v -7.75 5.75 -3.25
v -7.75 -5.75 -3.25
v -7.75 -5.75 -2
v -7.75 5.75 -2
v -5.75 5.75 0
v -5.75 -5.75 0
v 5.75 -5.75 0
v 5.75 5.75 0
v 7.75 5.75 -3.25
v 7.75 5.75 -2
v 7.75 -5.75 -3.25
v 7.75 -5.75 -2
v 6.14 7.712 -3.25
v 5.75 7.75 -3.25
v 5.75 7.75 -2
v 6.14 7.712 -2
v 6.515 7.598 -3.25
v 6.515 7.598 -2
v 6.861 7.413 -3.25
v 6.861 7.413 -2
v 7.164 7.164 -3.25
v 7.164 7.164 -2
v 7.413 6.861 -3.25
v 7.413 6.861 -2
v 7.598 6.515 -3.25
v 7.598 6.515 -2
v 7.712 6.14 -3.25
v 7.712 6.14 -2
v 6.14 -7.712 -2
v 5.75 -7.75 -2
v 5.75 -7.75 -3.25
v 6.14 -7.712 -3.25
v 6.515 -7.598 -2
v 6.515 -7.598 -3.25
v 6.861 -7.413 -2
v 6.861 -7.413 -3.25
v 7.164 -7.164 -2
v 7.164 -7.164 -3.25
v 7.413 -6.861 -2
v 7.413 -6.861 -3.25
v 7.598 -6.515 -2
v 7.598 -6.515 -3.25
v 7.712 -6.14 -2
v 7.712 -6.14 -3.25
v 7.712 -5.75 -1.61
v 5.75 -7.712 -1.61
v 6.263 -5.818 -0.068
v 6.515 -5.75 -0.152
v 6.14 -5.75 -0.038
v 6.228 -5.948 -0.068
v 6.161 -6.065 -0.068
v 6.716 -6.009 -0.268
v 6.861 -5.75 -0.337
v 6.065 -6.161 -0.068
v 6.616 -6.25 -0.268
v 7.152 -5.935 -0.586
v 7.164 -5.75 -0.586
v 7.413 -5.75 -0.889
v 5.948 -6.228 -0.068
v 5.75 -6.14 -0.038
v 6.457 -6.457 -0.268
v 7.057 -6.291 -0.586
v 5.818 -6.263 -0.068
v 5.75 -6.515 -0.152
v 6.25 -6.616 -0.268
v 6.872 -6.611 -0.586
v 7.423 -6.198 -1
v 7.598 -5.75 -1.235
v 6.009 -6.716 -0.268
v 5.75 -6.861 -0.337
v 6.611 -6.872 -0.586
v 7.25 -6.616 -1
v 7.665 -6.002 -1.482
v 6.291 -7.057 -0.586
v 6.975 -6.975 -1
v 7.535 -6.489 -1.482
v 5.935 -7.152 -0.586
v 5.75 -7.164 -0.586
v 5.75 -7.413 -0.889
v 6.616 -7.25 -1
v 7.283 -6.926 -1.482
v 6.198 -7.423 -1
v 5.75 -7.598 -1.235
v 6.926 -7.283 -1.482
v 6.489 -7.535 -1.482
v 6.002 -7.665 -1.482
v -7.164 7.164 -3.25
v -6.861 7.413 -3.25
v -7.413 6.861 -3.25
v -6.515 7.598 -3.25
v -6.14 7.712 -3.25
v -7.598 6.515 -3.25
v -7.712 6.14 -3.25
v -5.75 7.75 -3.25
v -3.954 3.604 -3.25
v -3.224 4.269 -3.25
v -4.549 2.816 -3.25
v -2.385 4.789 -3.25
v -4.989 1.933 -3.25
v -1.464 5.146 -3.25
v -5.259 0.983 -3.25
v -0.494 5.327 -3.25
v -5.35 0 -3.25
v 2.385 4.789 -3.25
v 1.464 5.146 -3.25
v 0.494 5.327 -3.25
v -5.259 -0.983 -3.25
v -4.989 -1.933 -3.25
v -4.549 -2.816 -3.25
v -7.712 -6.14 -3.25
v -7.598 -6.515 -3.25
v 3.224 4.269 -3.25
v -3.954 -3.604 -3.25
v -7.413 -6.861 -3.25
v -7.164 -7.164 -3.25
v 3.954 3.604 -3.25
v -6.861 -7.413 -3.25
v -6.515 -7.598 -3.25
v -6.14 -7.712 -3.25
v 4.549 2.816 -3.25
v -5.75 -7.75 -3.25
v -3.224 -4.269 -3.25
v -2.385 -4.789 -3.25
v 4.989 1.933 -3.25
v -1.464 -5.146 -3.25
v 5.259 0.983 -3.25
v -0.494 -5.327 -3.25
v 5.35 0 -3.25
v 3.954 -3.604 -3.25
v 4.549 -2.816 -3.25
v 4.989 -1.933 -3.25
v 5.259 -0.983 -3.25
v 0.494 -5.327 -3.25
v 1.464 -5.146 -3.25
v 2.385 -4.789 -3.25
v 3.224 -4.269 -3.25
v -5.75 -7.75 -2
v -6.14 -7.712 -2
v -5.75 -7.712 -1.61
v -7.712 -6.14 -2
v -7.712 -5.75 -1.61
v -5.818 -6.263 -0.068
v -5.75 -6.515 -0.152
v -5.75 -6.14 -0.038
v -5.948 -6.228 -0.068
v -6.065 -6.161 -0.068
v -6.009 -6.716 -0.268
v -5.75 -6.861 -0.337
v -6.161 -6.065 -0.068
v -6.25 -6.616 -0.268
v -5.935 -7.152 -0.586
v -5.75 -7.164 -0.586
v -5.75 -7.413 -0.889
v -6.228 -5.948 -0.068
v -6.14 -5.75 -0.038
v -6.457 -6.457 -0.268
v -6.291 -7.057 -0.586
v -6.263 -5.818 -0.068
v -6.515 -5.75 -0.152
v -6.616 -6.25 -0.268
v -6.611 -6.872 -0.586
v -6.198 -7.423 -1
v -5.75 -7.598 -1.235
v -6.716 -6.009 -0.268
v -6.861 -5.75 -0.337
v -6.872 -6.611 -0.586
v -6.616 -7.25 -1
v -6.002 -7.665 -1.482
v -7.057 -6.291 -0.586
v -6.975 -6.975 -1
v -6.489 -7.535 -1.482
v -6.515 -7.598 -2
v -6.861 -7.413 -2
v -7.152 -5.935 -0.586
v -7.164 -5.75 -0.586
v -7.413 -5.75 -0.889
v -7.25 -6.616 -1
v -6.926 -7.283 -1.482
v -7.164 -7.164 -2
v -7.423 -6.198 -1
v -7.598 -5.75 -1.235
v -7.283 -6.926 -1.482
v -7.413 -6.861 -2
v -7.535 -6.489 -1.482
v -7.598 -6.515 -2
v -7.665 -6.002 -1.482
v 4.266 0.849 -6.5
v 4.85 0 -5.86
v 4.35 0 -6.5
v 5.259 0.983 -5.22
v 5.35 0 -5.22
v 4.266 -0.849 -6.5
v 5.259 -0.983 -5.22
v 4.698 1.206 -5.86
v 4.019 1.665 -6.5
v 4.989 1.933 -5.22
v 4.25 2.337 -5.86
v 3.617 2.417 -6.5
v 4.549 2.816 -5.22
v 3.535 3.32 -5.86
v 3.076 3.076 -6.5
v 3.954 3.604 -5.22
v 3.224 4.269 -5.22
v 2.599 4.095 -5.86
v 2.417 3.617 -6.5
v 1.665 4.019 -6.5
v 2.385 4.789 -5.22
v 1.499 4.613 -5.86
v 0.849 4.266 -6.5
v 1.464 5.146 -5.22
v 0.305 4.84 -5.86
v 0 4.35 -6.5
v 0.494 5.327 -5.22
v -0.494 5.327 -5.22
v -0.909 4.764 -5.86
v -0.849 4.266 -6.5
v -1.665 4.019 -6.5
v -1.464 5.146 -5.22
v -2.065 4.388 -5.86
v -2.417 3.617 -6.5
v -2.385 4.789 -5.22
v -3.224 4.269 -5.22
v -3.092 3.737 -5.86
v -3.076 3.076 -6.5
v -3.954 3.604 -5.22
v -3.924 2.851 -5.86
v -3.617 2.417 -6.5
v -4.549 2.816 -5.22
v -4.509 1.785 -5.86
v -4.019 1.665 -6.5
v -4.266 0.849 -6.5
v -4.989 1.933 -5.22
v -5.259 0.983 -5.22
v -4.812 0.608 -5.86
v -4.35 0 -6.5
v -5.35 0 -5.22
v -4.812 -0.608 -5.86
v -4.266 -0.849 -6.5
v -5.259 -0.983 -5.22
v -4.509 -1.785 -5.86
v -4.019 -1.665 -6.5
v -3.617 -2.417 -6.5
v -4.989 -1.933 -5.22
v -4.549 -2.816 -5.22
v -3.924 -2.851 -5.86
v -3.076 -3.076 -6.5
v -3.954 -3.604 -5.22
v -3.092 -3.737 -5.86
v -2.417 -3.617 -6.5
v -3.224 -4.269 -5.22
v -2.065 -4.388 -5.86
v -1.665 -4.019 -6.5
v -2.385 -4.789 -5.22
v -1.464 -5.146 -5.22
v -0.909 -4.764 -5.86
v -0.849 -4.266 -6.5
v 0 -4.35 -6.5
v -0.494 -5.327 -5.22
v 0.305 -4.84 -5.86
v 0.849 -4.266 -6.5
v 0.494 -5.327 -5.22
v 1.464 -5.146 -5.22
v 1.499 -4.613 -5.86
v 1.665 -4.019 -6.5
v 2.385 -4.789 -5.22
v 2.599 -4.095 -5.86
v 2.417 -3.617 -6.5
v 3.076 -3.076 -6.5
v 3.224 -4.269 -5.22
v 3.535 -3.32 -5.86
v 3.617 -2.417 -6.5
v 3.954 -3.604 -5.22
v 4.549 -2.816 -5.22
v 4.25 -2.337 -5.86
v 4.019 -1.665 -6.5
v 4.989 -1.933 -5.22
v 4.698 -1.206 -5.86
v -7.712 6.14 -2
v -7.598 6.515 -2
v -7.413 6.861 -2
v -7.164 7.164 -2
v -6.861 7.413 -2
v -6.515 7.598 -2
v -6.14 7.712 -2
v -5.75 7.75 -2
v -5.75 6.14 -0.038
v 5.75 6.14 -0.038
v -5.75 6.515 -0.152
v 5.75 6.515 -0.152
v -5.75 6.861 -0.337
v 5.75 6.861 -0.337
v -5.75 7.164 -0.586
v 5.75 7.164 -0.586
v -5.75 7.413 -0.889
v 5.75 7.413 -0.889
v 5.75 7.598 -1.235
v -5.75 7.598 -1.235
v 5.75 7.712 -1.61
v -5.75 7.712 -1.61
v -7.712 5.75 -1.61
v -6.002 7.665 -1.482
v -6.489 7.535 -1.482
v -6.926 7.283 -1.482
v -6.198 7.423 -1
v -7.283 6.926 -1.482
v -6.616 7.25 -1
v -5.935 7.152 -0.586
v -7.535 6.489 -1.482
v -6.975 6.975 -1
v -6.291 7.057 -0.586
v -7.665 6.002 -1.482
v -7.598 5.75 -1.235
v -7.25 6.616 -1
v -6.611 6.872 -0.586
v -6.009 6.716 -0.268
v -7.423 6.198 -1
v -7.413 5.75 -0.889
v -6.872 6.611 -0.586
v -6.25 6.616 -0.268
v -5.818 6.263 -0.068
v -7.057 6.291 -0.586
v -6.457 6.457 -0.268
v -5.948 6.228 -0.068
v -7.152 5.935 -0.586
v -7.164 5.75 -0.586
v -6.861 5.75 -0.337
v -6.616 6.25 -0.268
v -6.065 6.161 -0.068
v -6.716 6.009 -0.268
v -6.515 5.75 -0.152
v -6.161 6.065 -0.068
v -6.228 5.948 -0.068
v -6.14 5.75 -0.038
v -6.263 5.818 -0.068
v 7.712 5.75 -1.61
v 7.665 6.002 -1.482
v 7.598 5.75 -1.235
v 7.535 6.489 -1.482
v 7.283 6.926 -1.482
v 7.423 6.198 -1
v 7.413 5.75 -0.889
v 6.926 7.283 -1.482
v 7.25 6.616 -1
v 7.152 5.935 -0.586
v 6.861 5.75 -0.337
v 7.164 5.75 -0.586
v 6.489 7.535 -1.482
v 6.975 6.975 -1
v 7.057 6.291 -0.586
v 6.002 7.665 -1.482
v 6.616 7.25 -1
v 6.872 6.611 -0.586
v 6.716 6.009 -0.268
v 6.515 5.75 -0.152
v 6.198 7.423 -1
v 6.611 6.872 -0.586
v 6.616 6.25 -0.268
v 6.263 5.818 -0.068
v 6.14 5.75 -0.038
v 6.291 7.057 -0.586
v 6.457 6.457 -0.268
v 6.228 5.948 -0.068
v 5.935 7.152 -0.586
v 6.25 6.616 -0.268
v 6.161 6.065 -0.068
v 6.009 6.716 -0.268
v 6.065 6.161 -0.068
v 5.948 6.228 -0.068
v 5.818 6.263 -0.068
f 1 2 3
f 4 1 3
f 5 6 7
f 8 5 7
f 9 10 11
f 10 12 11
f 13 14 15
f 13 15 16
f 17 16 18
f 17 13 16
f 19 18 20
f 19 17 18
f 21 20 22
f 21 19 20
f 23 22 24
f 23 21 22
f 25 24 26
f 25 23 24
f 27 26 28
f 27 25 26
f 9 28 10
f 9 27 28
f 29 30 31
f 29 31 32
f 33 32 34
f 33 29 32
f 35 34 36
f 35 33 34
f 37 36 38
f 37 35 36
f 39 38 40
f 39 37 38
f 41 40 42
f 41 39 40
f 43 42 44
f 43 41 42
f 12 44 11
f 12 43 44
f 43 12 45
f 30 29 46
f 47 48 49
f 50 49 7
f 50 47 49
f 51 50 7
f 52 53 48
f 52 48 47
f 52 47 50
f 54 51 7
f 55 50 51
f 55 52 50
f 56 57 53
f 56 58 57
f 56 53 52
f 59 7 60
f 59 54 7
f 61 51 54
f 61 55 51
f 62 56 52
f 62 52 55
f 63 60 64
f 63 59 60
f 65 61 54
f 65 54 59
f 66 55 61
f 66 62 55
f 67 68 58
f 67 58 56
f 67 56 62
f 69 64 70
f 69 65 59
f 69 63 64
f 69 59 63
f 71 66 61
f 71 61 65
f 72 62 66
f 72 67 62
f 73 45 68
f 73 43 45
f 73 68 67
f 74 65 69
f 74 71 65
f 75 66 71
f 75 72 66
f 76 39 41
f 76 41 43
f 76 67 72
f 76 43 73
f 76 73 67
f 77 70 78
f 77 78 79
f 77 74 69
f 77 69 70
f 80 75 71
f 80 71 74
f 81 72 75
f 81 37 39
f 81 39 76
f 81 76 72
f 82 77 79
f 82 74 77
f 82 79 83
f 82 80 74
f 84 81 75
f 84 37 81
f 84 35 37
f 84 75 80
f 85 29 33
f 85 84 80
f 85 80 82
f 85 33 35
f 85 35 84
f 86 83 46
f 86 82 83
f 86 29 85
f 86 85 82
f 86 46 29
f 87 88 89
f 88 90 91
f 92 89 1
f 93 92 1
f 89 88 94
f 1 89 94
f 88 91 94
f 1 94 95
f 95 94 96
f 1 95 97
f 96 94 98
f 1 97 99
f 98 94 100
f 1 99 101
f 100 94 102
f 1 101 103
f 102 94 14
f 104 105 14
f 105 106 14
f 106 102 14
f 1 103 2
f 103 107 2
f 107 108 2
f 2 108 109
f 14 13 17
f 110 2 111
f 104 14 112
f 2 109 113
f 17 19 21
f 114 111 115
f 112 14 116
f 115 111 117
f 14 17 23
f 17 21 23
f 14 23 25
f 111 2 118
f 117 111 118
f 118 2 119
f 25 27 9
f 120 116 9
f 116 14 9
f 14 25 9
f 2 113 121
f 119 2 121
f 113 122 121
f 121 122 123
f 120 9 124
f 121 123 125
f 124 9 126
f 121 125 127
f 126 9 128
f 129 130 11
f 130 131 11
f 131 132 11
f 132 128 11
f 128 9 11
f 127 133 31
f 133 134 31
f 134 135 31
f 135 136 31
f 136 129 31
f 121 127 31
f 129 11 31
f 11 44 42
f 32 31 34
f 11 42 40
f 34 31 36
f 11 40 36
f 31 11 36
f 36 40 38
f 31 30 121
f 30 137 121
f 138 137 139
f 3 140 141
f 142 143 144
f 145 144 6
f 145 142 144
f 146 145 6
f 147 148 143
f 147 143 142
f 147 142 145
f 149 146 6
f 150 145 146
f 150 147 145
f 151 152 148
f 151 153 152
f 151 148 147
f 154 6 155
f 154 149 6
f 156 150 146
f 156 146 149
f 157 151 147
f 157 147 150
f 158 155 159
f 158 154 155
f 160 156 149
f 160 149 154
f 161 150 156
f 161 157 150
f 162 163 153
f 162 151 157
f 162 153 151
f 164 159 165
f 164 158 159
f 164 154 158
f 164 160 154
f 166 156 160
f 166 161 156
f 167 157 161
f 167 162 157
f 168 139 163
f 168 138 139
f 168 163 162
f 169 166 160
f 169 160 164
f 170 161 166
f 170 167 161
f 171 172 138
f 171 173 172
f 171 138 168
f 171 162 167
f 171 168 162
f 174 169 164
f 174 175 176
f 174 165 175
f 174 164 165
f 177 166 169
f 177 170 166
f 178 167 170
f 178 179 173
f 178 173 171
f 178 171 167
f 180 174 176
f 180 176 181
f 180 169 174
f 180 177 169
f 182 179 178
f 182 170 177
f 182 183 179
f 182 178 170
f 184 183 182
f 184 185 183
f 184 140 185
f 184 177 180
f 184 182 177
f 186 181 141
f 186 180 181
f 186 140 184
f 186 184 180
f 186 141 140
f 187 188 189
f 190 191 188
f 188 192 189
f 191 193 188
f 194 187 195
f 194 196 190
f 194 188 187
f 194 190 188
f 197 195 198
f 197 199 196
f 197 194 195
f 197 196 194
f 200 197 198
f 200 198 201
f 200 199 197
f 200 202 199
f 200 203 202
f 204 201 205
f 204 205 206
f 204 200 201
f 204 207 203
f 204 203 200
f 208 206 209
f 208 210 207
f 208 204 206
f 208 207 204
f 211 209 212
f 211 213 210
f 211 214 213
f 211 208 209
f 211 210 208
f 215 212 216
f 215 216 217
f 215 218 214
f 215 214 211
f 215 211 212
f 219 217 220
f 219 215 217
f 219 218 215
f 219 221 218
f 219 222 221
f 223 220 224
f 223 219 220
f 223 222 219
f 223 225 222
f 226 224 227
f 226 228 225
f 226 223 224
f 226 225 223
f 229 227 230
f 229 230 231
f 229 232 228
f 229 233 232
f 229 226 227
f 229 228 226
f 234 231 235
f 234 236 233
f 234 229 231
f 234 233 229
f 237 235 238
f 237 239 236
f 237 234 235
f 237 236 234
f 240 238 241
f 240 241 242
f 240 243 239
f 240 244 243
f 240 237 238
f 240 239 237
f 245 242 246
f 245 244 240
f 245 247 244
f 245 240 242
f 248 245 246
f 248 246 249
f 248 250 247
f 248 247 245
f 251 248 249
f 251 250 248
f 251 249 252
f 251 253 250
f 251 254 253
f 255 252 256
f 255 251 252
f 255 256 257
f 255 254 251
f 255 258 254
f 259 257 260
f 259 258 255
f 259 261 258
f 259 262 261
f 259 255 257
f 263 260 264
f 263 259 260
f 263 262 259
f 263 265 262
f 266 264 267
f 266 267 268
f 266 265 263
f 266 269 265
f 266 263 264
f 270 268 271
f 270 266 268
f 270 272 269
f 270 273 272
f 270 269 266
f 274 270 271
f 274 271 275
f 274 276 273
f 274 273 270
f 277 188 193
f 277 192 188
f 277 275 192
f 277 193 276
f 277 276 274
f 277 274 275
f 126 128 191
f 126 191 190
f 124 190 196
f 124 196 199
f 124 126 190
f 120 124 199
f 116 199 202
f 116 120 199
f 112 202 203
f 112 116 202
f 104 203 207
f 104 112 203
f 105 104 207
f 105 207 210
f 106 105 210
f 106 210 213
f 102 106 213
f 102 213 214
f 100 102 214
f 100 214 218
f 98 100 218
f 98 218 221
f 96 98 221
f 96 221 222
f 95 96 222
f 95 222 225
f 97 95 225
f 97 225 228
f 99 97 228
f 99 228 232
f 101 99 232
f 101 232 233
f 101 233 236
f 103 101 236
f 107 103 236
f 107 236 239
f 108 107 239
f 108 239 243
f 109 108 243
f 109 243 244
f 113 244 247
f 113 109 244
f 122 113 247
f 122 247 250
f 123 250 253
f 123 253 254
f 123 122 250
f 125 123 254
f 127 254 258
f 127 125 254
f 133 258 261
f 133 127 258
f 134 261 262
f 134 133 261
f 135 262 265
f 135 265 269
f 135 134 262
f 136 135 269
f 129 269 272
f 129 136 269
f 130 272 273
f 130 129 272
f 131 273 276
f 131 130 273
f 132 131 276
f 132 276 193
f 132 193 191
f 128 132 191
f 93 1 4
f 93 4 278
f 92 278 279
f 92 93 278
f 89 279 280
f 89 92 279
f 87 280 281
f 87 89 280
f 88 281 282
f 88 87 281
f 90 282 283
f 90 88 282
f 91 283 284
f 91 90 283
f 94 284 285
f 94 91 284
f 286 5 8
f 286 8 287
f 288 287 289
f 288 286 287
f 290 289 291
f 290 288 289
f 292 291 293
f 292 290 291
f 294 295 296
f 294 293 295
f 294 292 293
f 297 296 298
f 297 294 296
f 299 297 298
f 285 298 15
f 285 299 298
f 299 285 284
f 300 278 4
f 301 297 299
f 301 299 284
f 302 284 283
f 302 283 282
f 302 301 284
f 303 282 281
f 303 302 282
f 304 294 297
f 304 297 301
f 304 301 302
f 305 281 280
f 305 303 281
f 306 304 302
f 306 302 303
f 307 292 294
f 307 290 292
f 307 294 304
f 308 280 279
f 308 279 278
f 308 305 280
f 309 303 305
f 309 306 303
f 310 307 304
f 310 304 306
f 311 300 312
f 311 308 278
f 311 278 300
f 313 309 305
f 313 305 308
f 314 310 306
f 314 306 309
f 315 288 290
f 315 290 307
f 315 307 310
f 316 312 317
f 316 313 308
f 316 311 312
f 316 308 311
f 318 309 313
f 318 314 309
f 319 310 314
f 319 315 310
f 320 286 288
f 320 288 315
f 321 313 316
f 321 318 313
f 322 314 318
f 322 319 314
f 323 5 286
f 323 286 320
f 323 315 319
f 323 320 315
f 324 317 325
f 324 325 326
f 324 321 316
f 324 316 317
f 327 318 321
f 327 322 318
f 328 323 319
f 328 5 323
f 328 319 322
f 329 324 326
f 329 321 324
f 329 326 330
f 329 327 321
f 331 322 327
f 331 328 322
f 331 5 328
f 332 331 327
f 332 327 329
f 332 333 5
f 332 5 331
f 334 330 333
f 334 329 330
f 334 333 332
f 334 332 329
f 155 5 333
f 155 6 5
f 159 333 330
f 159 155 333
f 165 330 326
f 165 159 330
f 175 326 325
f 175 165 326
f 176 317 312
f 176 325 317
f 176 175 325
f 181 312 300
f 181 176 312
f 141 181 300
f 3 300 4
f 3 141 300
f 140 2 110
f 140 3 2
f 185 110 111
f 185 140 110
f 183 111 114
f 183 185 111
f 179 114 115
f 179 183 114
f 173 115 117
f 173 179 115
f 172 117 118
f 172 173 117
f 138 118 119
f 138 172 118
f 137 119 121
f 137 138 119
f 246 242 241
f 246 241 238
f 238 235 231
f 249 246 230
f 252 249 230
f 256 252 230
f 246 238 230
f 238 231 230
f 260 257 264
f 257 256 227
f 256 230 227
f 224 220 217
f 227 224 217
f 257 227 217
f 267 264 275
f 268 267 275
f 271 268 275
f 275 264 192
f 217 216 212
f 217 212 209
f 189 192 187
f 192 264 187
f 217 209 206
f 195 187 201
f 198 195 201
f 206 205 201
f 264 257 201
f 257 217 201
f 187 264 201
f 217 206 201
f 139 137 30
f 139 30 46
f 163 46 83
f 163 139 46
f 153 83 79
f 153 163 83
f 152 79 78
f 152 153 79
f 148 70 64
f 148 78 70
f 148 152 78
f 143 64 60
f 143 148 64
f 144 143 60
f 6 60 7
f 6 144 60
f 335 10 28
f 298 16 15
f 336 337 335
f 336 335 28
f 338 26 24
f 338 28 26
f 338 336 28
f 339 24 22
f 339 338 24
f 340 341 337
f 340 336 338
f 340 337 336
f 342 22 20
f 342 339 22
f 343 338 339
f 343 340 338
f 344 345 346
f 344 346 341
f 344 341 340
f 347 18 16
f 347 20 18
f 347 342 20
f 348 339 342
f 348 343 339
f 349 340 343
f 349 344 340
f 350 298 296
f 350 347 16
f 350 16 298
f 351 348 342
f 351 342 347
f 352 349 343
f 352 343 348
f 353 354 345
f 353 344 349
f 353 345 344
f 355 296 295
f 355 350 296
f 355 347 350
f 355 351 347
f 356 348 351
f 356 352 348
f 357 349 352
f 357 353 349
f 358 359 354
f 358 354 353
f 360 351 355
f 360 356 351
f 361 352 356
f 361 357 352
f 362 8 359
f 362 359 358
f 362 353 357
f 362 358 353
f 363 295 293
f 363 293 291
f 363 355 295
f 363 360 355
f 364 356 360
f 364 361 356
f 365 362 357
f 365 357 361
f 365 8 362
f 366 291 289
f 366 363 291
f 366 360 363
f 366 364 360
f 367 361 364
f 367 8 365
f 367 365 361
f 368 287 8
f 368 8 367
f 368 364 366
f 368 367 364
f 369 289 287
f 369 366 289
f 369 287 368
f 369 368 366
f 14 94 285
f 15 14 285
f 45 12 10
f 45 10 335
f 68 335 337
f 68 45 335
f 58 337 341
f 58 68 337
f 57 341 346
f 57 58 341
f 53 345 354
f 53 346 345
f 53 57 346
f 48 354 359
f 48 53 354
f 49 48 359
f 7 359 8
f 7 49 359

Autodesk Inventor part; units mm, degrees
sketch "Sketch_4" plane through (0, 0, 0) normal (0, 1, 0) x (-1, 0, 0)
  arc A0 (7.75, -2) -> (5.75, 0) centre (5.75, -2) ccw
  line L0 (5.75, 0) -> (-5.75, 0)
  arc A1 (-5.75, 0) -> (-7.75, -2) centre (-5.75, -2) ccw
  line L1 (-7.75, -2) -> (-7.75, -3.25)
  line L2 (-7.75, -3.25) -> (7.75, -3.25)
  line L3 (7.75, -3.25) -> (7.75, -2)
extrude "Extrusion1" add sketch "Sketch_4" along normal mid plane 11.5
sketch "Sketch_5" plane through (0, 0, 0) normal (1, 0, 0) x (0, 1, 0)
  line L0 (5.75, 0) -> (-5.75, 0)
  arc A0 (-5.75, 0) -> (-7.75, -2) centre (-5.75, -2) ccw
  line L1 (-7.75, -2) -> (-7.75, -3.25)
  line L2 (-7.75, -3.25) -> (7.75, -3.25)
  line L3 (7.75, -3.25) -> (7.75, -2)
  arc A1 (7.75, -2) -> (5.75, 0) centre (5.75, -2) ccw
extrude "Extrusion2" add sketch "Sketch_5" along normal mid plane 11.5
sketch "Sketch_6" plane through (-5.75, 0, 0) normal (1, 0, 0) x (0, 0, -1)
  line L0 (3.25, 5.75) -> (0, 5.75)
  arc A0 (2, 7.75) -> (0, 5.75) centre (2, 5.75) ccw
  line L1 (2, 7.75) -> (3.25, 7.75)
  line L2 (3.25, 7.75) -> (3.25, 5.75)
  line L3 (3.25, 5.75) -> (0, 5.75)
revolve "Revolution1" add sketch "Sketch_6" angle 90 about axis through (-5.75, 5.75, -3.25) along (0, 0, 1)
sketch "Sketch_7" plane through (-5.75, 0, 0) normal (1, 0, 0) x (0, 0, -1)
  line L0 (0, -5.75) -> (3.25, -5.75)
  line L1 (3.25, -5.75) -> (3.25, -7.75)
  line L2 (3.25, -7.75) -> (2, -7.75)
  arc A0 (0, -5.75) -> (2, -7.75) centre (2, -5.75) ccw
  line L3 (0, -5.75) -> (3.25, -5.75)
revolve "Revolution2" add sketch "Sketch_7" angle 90 about axis through (-5.75, -5.75, 0) along (0, 0, -1)
sketch "Sketch_8" plane through (5.75, 0, 0) normal (1, 0, 0) x (0, 0, -1)
  line L0 (3.25, 5.75) -> (0, 5.75)
  arc A0 (2, 7.75) -> (0, 5.75) centre (2, 5.75) ccw
  line L1 (2, 7.75) -> (3.25, 7.75)
  line L2 (3.25, 7.75) -> (3.25, 5.75)
  line L3 (3.25, 5.75) -> (0, 5.75)
revolve "Revolution3" add sketch "Sketch_8" angle 90 about axis through (5.75, 5.75, -3.25) along (0, 0, -1)
sketch "Sketch_9" plane through (5.75, 0, 0) normal (1, 0, 0) x (0, 0, -1)
  line L0 (0, -5.75) -> (3.25, -5.75)
  line L1 (3.25, -5.75) -> (3.25, -7.75)
  line L2 (3.25, -7.75) -> (2, -7.75)
  arc A0 (0, -5.75) -> (2, -7.75) centre (2, -5.75) ccw
  line L3 (0, -5.75) -> (3.25, -5.75)
revolve "Revolution4" add sketch "Sketch_9" angle 90 about axis through (5.75, -5.75, 0) along (0, 0, 1)
sketch "Sketch_10" plane through (0, 0, 0) normal (0, 1, 0) x (-1, 0, 0)
  line L0 (0, 0) -> (0, -6.5)
  line L1 (0, -6.5) -> (-4.35, -6.5)
  line L2 (-4.35, -6.5) -> (-5.35, -5.2201)
  line L3 (-5.35, -5.2201) -> (-5.35, 0)
  line L4 (-5.35, 0) -> (0, 0)
  line L5 (0, 0) -> (0, -6.5)
revolve "Revolution5" add sketch "Sketch_10" angle 360 about axis through (0, 0, 0) along (0, 0, 1)
ref_plane "CAP_XY" through (0, 0, 0) normal (0, 0, 1) x (1, 0, 0)
ref_plane "CAP_YZ" through (0, 0, 0) normal (1, 0, 0) x (0, 1, 0)
ref_plane "CAP_ZX" through (0, 0, 0) normal (0, 1, 0) x (0, 0, 1)
properties part number "0000-00189079(1)"
